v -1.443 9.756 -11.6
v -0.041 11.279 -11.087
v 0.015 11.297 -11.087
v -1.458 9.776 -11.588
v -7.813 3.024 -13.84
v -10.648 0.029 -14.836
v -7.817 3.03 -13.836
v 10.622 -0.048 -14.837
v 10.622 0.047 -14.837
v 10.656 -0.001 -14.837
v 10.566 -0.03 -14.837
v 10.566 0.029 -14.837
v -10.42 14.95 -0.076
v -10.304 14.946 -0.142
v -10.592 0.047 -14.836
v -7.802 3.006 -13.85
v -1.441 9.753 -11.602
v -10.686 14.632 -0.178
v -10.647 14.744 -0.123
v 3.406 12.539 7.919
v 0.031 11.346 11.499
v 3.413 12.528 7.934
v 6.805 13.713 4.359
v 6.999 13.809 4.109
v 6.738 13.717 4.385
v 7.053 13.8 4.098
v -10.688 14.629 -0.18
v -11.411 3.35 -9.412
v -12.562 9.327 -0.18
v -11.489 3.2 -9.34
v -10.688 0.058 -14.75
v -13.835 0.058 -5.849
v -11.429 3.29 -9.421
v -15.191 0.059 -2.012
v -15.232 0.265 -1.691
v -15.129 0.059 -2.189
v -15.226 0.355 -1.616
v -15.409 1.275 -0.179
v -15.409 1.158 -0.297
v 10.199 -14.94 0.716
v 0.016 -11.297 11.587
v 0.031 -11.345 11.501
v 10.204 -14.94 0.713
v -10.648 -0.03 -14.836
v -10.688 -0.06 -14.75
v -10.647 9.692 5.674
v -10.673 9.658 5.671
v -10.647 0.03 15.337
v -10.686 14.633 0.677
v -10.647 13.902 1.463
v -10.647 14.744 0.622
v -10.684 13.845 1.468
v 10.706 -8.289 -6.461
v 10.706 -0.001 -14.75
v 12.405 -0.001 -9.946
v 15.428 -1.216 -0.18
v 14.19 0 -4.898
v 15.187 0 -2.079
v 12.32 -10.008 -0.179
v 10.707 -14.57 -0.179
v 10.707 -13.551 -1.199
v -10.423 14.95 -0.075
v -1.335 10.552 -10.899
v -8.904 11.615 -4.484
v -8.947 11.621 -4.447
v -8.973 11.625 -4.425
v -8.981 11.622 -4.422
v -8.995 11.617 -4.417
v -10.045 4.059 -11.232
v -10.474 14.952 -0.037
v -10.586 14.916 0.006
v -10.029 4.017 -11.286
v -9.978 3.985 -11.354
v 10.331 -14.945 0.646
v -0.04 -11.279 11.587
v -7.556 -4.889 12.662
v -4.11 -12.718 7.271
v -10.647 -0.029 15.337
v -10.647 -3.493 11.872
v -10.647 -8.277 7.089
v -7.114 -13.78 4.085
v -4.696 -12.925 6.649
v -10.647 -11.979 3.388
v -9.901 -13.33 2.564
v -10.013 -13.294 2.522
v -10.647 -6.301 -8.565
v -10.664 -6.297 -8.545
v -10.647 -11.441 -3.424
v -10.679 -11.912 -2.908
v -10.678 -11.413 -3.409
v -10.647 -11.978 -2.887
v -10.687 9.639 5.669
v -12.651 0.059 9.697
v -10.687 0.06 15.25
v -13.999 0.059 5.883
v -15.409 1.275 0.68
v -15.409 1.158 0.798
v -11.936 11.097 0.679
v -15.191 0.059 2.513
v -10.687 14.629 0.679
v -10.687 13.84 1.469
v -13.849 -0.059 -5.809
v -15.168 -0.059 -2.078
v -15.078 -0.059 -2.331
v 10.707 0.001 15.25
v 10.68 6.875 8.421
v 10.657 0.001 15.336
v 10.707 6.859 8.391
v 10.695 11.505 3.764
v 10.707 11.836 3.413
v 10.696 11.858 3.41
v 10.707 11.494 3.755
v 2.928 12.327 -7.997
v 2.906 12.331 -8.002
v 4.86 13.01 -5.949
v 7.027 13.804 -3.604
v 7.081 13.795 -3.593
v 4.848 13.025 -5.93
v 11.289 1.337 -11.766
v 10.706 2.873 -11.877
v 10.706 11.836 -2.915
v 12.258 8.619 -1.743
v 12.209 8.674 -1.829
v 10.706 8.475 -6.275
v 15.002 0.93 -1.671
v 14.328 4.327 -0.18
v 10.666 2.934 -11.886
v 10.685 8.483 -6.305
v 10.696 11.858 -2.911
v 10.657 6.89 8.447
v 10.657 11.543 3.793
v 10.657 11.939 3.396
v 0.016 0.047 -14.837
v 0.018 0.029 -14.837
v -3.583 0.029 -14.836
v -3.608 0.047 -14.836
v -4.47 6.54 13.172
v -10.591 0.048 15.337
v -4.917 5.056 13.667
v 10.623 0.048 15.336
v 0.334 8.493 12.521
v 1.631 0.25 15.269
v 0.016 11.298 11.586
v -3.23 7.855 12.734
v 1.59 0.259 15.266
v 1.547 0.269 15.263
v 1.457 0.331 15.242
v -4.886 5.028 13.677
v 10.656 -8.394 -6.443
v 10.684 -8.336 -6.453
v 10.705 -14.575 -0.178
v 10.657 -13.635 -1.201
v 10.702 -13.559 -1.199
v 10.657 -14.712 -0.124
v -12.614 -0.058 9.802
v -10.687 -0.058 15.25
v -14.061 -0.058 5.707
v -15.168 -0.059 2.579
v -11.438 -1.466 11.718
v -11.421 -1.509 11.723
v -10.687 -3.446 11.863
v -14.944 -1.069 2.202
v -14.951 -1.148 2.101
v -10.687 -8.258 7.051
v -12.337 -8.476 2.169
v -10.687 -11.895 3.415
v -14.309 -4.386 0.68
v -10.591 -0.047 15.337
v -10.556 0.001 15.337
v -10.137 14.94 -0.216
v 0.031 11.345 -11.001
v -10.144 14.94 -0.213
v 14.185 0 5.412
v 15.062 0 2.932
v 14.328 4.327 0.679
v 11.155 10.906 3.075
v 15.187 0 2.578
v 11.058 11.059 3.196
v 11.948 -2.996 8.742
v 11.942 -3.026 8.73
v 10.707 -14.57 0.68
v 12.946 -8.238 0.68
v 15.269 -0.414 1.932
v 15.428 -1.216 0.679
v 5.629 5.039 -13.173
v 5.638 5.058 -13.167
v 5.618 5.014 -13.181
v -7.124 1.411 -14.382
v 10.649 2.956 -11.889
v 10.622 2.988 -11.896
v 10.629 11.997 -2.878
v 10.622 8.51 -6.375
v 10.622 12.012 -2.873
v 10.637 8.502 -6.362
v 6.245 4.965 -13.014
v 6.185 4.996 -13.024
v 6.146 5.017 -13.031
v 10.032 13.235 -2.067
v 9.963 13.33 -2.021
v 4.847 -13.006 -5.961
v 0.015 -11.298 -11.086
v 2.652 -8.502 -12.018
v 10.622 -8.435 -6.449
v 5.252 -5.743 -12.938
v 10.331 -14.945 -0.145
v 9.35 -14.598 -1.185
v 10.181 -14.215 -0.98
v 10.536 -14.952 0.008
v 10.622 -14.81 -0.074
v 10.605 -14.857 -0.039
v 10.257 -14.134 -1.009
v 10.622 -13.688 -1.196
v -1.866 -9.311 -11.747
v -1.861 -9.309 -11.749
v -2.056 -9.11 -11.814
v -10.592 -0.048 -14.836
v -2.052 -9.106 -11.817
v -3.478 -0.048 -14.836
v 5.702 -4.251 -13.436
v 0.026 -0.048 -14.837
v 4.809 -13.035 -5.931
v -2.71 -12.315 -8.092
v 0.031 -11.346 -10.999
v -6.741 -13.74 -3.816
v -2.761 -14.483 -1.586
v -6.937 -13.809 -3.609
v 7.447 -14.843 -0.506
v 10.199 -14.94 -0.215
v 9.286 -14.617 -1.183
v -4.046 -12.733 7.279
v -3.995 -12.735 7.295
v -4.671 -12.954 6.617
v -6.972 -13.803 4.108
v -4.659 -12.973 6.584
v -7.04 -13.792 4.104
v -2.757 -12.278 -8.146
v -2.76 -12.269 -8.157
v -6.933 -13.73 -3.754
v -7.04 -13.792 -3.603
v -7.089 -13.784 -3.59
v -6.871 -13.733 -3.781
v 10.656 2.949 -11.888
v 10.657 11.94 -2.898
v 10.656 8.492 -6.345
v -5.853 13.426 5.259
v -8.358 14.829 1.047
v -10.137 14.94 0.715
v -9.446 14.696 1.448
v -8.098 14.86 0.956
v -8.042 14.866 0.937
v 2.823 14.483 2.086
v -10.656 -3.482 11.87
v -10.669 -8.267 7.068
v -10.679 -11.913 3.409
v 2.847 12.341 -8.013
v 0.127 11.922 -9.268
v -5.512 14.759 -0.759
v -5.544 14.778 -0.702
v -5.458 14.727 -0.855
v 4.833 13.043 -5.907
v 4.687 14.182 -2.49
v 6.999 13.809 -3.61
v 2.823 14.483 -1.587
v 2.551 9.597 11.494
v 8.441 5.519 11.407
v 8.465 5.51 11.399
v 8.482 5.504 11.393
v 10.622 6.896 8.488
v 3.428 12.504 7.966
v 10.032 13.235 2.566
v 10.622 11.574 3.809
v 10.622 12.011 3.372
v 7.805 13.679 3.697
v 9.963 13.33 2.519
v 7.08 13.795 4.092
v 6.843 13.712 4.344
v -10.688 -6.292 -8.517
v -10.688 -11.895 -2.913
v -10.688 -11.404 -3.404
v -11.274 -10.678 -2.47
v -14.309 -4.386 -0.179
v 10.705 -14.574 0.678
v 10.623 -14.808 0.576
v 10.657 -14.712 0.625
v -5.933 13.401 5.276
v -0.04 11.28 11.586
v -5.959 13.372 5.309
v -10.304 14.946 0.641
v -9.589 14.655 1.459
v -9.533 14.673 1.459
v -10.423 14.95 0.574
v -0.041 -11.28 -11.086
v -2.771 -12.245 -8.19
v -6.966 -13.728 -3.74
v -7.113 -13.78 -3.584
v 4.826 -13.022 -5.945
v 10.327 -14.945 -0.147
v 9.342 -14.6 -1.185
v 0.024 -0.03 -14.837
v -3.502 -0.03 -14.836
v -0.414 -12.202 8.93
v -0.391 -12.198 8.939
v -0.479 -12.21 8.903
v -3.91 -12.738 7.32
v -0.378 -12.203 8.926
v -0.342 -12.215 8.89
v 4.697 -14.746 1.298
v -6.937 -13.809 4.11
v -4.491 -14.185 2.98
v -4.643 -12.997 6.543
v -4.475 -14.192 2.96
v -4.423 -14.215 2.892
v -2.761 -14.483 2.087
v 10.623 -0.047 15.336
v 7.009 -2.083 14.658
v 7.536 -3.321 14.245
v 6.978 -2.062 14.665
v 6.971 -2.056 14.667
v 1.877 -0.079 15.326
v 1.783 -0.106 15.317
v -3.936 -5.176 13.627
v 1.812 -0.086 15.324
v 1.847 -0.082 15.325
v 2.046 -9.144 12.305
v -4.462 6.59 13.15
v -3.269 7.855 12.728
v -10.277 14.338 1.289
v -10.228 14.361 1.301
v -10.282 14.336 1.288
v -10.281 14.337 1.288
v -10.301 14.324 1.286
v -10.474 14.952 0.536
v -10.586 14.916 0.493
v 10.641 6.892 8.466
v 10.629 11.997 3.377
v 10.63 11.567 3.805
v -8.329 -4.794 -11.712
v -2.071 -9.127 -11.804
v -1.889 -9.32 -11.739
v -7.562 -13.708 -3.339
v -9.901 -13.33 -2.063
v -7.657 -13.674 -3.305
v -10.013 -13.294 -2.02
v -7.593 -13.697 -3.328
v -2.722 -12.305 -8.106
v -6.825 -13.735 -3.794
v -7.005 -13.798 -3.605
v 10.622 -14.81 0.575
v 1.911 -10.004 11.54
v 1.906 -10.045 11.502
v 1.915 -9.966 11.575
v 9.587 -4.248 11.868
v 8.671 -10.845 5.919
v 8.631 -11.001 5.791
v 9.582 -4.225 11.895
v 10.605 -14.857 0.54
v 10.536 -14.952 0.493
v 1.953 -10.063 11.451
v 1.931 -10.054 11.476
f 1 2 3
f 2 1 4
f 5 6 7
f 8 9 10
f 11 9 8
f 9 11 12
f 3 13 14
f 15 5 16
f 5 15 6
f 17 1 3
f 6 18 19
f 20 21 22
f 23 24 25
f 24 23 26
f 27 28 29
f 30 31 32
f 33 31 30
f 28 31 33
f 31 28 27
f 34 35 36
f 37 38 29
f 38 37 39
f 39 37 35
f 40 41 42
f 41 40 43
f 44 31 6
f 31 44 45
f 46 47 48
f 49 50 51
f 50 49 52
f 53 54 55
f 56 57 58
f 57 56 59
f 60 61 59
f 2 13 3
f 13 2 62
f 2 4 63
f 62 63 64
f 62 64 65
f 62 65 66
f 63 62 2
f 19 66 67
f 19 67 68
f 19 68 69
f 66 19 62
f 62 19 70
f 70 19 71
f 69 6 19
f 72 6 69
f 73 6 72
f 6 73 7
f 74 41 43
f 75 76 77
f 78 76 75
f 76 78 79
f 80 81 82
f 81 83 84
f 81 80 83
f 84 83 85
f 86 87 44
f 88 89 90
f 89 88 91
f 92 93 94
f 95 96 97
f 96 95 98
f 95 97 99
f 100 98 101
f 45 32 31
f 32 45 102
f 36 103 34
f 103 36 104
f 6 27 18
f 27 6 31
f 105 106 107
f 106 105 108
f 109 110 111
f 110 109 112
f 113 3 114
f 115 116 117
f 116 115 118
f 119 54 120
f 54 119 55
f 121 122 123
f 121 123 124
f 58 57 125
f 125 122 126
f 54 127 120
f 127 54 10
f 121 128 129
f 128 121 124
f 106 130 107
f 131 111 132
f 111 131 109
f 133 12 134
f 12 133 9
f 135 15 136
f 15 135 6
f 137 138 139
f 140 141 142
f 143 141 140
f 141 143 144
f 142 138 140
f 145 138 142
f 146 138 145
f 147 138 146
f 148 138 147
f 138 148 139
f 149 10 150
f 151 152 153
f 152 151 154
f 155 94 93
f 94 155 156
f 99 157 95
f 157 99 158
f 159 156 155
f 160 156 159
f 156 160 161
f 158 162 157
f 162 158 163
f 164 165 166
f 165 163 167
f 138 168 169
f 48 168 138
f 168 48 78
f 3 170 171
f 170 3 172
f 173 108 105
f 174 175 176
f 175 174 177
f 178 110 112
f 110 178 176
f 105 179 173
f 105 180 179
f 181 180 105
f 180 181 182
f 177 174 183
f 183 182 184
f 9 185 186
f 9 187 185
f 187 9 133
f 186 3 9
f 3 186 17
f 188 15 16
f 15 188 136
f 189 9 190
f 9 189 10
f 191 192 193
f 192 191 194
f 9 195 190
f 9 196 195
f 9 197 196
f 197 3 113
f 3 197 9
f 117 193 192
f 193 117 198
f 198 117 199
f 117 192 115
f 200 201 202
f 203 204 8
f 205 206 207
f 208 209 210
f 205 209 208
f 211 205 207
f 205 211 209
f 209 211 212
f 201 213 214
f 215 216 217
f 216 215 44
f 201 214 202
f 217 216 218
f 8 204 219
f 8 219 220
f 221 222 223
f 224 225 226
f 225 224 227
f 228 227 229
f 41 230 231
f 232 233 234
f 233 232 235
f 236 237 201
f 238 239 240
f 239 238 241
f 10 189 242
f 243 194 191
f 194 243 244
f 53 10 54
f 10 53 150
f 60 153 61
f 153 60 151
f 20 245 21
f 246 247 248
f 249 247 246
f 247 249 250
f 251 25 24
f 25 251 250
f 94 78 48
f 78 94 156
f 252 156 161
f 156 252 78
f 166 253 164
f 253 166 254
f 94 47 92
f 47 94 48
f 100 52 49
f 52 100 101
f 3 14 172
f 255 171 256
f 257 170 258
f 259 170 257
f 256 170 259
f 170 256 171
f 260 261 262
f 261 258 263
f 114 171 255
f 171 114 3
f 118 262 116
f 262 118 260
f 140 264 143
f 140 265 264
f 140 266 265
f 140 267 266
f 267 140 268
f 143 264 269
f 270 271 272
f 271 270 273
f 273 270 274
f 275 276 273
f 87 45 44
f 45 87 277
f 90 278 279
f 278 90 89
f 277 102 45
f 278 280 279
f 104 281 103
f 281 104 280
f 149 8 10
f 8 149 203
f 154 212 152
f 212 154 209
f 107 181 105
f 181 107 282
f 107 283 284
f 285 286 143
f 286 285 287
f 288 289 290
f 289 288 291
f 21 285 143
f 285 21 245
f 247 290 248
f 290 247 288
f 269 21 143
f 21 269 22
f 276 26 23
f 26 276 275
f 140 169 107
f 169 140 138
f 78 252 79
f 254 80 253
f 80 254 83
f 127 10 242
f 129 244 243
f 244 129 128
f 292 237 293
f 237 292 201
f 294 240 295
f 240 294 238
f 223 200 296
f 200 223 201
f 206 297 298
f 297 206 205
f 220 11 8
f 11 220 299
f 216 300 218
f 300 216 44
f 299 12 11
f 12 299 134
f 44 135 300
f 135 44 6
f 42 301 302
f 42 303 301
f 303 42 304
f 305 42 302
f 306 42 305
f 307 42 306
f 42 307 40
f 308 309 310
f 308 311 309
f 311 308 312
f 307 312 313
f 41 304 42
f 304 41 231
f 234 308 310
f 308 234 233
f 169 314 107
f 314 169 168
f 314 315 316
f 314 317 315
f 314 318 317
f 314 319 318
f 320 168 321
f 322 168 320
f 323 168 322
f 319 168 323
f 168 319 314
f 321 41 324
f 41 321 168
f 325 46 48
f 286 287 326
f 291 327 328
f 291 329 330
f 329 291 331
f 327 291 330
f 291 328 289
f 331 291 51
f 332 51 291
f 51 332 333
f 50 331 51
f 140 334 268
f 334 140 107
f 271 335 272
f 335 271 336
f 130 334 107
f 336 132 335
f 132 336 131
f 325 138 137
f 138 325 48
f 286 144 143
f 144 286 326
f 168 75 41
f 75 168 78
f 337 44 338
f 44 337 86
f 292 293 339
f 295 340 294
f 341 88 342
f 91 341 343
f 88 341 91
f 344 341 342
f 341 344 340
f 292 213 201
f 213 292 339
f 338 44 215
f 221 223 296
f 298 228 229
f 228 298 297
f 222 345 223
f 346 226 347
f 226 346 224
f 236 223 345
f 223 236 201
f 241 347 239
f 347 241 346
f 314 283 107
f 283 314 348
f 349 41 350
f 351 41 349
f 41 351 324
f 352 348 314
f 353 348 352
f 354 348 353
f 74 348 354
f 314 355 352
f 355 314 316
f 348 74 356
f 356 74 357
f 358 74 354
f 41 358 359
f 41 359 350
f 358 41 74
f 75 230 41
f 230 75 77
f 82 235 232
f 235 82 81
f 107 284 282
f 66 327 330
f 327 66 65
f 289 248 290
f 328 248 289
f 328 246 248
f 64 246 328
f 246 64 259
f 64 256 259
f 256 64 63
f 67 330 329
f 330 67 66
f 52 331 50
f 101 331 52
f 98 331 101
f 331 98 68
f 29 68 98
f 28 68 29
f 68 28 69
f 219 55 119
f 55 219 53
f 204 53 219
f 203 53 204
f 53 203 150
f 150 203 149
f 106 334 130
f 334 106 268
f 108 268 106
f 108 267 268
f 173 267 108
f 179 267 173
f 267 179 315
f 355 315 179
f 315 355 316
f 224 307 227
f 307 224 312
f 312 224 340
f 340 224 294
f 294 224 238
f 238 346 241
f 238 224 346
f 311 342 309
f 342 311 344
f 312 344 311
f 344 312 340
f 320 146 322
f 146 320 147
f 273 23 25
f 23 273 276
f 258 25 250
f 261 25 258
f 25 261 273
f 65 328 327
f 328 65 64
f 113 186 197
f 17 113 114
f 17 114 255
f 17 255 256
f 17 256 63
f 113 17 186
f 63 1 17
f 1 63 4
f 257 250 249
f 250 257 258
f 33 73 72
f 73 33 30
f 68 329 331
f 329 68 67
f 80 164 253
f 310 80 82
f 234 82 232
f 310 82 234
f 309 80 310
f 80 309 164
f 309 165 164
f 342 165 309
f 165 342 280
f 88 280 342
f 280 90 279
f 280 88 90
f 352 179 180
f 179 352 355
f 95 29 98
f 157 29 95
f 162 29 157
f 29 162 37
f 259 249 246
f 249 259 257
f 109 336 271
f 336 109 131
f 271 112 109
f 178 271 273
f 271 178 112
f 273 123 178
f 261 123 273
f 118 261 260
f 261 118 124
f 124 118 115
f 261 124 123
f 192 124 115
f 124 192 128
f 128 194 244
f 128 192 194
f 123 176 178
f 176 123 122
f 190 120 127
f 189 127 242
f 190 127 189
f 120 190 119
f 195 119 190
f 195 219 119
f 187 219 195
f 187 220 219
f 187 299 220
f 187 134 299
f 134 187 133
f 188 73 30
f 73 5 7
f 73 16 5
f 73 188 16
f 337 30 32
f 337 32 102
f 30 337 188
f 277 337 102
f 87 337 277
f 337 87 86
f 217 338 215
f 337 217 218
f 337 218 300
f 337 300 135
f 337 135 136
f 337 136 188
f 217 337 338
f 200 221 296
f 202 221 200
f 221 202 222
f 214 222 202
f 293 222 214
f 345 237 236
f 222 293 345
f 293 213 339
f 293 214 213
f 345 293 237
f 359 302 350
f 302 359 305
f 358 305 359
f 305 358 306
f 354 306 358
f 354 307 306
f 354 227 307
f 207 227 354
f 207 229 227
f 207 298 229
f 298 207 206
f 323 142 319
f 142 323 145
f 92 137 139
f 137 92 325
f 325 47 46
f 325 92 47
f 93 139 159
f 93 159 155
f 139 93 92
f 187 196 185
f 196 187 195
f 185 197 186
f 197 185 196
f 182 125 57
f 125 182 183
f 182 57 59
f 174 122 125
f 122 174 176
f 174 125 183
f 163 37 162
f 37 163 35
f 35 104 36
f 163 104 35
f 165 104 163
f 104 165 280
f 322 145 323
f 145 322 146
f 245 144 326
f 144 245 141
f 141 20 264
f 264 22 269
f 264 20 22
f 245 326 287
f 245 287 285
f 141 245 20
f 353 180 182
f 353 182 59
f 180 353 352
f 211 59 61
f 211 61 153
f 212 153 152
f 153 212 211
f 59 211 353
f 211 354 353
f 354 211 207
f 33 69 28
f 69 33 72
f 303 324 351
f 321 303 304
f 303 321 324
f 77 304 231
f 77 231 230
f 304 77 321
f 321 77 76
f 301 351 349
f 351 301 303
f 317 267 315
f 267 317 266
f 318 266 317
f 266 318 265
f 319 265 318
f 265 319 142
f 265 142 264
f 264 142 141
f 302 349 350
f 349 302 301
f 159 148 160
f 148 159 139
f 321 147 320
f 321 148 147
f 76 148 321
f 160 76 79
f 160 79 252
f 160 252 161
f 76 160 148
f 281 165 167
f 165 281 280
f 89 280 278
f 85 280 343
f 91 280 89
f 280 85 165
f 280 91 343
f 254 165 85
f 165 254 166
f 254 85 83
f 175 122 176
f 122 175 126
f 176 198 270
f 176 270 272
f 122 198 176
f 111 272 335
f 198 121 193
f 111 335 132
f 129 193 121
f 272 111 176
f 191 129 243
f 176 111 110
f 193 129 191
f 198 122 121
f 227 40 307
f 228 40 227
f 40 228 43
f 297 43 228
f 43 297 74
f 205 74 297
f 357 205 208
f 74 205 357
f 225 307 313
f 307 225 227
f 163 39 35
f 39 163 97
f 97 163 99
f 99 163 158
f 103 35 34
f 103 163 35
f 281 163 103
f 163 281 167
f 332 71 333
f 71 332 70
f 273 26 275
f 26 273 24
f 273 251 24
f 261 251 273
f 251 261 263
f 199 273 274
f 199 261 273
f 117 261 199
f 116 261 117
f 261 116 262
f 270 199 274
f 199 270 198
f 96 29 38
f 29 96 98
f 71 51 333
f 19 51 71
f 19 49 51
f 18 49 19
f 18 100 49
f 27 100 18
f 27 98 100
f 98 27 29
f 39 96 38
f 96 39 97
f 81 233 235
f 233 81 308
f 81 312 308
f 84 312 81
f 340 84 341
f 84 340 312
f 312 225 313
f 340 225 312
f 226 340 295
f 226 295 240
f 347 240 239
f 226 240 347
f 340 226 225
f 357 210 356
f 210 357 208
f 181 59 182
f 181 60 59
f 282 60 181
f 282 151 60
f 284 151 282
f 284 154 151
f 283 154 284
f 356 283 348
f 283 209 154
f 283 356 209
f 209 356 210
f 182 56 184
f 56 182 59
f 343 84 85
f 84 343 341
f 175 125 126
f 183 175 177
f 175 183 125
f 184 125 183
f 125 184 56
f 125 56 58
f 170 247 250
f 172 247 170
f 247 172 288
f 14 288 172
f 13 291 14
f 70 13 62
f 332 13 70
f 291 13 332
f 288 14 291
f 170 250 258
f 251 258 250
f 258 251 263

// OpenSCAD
// Auto-generated OpenSCAD file

    shift = 0.25;

    inner_points = 10*[[1.5327957276060136, -0.12164394971032078, 0.4086441079125258], [-1.5327957276060136, 0.12164394971032078, -0.4086441079125258], [0.3222216494042708, -0.6680925499074873, -1.4075068573237228], [-0.3222216494042708, 0.6680925499074873, 1.4075068573237228], [0.2792140148487219, 1.438785979309287, -0.6190189331959671], [-0.2792140148487219, -1.438785979309287, 0.6190189331959671], [1.422820927906004, 0.4326996531276527, -1.078587788404776], [-0.6209067089020139, 0.5948915860747469, -1.6234465989548104], [1.050535574774375, -1.4856816526180632, -0.25322921081015326], [-0.993192062033643, -1.323489719670969, -0.7980880213601876], [0.993192062033643, 1.323489719670969, 0.7980880213601876], [-1.050535574774375, 1.4856816526180632, 0.25322921081015326], [0.6209067089020139, -0.5948915860747469, 1.6234465989548104], [-1.422820927906004, -0.4326996531276527, 1.078587788404776]];

    outer_points_unshifted = 10*[[-3.649148042351724e-05, -1.1250600440804117, -1.1249399521228471], [3.649148042351724e-05, 1.1250600440804117, 1.1249399521228471], [-1.590990256832662, 0.0, 5.1609501201958964e-05], [1.590990256832662, 0.0, -5.1609501201958964e-05], [-3.649537601964202e-05, 1.1249399527147135, -1.1250600434884823], [3.649537601964202e-05, -1.1249399527147135, 1.1250600434884823], [-1.06070882912607, -8.006091046552921e-05, -1.4999655907400848], [-1.0606601738188386, 1.4999999978634166, -4.565457628876734e-05], [-1.0606601686247104, -1.4999999978634166, 0.00011446724455804595], [-1.060611513317479, 8.006091046552921e-05, 1.5000344034083541], [1.060611513317479, -8.006091046552921e-05, -1.5000344034083541], [1.0606601686247104, 1.4999999978634166, -0.00011446724455804595], [1.0606601738188386, -1.4999999978634166, 4.565457628876734e-05], [1.06070882912607, 8.006091046552921e-05, 1.4999655907400848]];
    
    outer_points = [for (p = outer_points_unshifted) [p[0], p[1], p[2] + shift]];

    // Convex hull for inner set (I)
    module inner_hull() {
        hull() {
            for (p = inner_points) {
                translate(p) sphere(r=0.1);
            }
        }
    }

    // Convex hull for outer set (O) minus inner hull (O \ I)
    module outer_minus_inner() {
        difference() {
            hull() {
                for (p = outer_points) {
                    translate(p) sphere(r=0.1);
                }
            }
            inner_hull(); // Subtract inner hull
        }
    }

    // Convex hull for outer set (O) minus all translated inner hulls
    module outer_minus_AllTranslationInner() {
        difference() {
            hull() {
                for (p = outer_points) {
                    translate(p) sphere(r=0.1);
                }
            }
            hull() {
                translate([0,0,50]) inner_hull();
                translate([0,0,-50]) inner_hull();
            }; // Subtract translated inner hulls
        }
    }

    // Difference between outer_minus_inner and outer_minus_AllTranslationInner
    module outer_minus_inner_diff() {
        difference() {
            // Outer minus inner
            difference() {
                hull() {
                    for (p = outer_points) {
                        translate(p) sphere(r=0.1);
                    }
                }
                inner_hull();
            }

            // Subtract Outer minus AllTranslationInner
            difference() {
                hull() {
                    for (p = outer_points) {
                        translate(p) sphere(r=0.1);
                    }
                }
                hull() {
                    translate([0,0,50]) inner_hull();
                    translate([0,0,-50]) inner_hull();
                };
            }
        }
    }

    // Rendering all with colors applied
    // color([1, 0, 0, 0.5]) inner_hull(); // Transparent red
    // color([0, 0, 1, 1]) outer_minus_inner(); // Opaque blue
    color([1, 1, 0, 1]) outer_minus_inner_diff(); // Opaque yellow
    
